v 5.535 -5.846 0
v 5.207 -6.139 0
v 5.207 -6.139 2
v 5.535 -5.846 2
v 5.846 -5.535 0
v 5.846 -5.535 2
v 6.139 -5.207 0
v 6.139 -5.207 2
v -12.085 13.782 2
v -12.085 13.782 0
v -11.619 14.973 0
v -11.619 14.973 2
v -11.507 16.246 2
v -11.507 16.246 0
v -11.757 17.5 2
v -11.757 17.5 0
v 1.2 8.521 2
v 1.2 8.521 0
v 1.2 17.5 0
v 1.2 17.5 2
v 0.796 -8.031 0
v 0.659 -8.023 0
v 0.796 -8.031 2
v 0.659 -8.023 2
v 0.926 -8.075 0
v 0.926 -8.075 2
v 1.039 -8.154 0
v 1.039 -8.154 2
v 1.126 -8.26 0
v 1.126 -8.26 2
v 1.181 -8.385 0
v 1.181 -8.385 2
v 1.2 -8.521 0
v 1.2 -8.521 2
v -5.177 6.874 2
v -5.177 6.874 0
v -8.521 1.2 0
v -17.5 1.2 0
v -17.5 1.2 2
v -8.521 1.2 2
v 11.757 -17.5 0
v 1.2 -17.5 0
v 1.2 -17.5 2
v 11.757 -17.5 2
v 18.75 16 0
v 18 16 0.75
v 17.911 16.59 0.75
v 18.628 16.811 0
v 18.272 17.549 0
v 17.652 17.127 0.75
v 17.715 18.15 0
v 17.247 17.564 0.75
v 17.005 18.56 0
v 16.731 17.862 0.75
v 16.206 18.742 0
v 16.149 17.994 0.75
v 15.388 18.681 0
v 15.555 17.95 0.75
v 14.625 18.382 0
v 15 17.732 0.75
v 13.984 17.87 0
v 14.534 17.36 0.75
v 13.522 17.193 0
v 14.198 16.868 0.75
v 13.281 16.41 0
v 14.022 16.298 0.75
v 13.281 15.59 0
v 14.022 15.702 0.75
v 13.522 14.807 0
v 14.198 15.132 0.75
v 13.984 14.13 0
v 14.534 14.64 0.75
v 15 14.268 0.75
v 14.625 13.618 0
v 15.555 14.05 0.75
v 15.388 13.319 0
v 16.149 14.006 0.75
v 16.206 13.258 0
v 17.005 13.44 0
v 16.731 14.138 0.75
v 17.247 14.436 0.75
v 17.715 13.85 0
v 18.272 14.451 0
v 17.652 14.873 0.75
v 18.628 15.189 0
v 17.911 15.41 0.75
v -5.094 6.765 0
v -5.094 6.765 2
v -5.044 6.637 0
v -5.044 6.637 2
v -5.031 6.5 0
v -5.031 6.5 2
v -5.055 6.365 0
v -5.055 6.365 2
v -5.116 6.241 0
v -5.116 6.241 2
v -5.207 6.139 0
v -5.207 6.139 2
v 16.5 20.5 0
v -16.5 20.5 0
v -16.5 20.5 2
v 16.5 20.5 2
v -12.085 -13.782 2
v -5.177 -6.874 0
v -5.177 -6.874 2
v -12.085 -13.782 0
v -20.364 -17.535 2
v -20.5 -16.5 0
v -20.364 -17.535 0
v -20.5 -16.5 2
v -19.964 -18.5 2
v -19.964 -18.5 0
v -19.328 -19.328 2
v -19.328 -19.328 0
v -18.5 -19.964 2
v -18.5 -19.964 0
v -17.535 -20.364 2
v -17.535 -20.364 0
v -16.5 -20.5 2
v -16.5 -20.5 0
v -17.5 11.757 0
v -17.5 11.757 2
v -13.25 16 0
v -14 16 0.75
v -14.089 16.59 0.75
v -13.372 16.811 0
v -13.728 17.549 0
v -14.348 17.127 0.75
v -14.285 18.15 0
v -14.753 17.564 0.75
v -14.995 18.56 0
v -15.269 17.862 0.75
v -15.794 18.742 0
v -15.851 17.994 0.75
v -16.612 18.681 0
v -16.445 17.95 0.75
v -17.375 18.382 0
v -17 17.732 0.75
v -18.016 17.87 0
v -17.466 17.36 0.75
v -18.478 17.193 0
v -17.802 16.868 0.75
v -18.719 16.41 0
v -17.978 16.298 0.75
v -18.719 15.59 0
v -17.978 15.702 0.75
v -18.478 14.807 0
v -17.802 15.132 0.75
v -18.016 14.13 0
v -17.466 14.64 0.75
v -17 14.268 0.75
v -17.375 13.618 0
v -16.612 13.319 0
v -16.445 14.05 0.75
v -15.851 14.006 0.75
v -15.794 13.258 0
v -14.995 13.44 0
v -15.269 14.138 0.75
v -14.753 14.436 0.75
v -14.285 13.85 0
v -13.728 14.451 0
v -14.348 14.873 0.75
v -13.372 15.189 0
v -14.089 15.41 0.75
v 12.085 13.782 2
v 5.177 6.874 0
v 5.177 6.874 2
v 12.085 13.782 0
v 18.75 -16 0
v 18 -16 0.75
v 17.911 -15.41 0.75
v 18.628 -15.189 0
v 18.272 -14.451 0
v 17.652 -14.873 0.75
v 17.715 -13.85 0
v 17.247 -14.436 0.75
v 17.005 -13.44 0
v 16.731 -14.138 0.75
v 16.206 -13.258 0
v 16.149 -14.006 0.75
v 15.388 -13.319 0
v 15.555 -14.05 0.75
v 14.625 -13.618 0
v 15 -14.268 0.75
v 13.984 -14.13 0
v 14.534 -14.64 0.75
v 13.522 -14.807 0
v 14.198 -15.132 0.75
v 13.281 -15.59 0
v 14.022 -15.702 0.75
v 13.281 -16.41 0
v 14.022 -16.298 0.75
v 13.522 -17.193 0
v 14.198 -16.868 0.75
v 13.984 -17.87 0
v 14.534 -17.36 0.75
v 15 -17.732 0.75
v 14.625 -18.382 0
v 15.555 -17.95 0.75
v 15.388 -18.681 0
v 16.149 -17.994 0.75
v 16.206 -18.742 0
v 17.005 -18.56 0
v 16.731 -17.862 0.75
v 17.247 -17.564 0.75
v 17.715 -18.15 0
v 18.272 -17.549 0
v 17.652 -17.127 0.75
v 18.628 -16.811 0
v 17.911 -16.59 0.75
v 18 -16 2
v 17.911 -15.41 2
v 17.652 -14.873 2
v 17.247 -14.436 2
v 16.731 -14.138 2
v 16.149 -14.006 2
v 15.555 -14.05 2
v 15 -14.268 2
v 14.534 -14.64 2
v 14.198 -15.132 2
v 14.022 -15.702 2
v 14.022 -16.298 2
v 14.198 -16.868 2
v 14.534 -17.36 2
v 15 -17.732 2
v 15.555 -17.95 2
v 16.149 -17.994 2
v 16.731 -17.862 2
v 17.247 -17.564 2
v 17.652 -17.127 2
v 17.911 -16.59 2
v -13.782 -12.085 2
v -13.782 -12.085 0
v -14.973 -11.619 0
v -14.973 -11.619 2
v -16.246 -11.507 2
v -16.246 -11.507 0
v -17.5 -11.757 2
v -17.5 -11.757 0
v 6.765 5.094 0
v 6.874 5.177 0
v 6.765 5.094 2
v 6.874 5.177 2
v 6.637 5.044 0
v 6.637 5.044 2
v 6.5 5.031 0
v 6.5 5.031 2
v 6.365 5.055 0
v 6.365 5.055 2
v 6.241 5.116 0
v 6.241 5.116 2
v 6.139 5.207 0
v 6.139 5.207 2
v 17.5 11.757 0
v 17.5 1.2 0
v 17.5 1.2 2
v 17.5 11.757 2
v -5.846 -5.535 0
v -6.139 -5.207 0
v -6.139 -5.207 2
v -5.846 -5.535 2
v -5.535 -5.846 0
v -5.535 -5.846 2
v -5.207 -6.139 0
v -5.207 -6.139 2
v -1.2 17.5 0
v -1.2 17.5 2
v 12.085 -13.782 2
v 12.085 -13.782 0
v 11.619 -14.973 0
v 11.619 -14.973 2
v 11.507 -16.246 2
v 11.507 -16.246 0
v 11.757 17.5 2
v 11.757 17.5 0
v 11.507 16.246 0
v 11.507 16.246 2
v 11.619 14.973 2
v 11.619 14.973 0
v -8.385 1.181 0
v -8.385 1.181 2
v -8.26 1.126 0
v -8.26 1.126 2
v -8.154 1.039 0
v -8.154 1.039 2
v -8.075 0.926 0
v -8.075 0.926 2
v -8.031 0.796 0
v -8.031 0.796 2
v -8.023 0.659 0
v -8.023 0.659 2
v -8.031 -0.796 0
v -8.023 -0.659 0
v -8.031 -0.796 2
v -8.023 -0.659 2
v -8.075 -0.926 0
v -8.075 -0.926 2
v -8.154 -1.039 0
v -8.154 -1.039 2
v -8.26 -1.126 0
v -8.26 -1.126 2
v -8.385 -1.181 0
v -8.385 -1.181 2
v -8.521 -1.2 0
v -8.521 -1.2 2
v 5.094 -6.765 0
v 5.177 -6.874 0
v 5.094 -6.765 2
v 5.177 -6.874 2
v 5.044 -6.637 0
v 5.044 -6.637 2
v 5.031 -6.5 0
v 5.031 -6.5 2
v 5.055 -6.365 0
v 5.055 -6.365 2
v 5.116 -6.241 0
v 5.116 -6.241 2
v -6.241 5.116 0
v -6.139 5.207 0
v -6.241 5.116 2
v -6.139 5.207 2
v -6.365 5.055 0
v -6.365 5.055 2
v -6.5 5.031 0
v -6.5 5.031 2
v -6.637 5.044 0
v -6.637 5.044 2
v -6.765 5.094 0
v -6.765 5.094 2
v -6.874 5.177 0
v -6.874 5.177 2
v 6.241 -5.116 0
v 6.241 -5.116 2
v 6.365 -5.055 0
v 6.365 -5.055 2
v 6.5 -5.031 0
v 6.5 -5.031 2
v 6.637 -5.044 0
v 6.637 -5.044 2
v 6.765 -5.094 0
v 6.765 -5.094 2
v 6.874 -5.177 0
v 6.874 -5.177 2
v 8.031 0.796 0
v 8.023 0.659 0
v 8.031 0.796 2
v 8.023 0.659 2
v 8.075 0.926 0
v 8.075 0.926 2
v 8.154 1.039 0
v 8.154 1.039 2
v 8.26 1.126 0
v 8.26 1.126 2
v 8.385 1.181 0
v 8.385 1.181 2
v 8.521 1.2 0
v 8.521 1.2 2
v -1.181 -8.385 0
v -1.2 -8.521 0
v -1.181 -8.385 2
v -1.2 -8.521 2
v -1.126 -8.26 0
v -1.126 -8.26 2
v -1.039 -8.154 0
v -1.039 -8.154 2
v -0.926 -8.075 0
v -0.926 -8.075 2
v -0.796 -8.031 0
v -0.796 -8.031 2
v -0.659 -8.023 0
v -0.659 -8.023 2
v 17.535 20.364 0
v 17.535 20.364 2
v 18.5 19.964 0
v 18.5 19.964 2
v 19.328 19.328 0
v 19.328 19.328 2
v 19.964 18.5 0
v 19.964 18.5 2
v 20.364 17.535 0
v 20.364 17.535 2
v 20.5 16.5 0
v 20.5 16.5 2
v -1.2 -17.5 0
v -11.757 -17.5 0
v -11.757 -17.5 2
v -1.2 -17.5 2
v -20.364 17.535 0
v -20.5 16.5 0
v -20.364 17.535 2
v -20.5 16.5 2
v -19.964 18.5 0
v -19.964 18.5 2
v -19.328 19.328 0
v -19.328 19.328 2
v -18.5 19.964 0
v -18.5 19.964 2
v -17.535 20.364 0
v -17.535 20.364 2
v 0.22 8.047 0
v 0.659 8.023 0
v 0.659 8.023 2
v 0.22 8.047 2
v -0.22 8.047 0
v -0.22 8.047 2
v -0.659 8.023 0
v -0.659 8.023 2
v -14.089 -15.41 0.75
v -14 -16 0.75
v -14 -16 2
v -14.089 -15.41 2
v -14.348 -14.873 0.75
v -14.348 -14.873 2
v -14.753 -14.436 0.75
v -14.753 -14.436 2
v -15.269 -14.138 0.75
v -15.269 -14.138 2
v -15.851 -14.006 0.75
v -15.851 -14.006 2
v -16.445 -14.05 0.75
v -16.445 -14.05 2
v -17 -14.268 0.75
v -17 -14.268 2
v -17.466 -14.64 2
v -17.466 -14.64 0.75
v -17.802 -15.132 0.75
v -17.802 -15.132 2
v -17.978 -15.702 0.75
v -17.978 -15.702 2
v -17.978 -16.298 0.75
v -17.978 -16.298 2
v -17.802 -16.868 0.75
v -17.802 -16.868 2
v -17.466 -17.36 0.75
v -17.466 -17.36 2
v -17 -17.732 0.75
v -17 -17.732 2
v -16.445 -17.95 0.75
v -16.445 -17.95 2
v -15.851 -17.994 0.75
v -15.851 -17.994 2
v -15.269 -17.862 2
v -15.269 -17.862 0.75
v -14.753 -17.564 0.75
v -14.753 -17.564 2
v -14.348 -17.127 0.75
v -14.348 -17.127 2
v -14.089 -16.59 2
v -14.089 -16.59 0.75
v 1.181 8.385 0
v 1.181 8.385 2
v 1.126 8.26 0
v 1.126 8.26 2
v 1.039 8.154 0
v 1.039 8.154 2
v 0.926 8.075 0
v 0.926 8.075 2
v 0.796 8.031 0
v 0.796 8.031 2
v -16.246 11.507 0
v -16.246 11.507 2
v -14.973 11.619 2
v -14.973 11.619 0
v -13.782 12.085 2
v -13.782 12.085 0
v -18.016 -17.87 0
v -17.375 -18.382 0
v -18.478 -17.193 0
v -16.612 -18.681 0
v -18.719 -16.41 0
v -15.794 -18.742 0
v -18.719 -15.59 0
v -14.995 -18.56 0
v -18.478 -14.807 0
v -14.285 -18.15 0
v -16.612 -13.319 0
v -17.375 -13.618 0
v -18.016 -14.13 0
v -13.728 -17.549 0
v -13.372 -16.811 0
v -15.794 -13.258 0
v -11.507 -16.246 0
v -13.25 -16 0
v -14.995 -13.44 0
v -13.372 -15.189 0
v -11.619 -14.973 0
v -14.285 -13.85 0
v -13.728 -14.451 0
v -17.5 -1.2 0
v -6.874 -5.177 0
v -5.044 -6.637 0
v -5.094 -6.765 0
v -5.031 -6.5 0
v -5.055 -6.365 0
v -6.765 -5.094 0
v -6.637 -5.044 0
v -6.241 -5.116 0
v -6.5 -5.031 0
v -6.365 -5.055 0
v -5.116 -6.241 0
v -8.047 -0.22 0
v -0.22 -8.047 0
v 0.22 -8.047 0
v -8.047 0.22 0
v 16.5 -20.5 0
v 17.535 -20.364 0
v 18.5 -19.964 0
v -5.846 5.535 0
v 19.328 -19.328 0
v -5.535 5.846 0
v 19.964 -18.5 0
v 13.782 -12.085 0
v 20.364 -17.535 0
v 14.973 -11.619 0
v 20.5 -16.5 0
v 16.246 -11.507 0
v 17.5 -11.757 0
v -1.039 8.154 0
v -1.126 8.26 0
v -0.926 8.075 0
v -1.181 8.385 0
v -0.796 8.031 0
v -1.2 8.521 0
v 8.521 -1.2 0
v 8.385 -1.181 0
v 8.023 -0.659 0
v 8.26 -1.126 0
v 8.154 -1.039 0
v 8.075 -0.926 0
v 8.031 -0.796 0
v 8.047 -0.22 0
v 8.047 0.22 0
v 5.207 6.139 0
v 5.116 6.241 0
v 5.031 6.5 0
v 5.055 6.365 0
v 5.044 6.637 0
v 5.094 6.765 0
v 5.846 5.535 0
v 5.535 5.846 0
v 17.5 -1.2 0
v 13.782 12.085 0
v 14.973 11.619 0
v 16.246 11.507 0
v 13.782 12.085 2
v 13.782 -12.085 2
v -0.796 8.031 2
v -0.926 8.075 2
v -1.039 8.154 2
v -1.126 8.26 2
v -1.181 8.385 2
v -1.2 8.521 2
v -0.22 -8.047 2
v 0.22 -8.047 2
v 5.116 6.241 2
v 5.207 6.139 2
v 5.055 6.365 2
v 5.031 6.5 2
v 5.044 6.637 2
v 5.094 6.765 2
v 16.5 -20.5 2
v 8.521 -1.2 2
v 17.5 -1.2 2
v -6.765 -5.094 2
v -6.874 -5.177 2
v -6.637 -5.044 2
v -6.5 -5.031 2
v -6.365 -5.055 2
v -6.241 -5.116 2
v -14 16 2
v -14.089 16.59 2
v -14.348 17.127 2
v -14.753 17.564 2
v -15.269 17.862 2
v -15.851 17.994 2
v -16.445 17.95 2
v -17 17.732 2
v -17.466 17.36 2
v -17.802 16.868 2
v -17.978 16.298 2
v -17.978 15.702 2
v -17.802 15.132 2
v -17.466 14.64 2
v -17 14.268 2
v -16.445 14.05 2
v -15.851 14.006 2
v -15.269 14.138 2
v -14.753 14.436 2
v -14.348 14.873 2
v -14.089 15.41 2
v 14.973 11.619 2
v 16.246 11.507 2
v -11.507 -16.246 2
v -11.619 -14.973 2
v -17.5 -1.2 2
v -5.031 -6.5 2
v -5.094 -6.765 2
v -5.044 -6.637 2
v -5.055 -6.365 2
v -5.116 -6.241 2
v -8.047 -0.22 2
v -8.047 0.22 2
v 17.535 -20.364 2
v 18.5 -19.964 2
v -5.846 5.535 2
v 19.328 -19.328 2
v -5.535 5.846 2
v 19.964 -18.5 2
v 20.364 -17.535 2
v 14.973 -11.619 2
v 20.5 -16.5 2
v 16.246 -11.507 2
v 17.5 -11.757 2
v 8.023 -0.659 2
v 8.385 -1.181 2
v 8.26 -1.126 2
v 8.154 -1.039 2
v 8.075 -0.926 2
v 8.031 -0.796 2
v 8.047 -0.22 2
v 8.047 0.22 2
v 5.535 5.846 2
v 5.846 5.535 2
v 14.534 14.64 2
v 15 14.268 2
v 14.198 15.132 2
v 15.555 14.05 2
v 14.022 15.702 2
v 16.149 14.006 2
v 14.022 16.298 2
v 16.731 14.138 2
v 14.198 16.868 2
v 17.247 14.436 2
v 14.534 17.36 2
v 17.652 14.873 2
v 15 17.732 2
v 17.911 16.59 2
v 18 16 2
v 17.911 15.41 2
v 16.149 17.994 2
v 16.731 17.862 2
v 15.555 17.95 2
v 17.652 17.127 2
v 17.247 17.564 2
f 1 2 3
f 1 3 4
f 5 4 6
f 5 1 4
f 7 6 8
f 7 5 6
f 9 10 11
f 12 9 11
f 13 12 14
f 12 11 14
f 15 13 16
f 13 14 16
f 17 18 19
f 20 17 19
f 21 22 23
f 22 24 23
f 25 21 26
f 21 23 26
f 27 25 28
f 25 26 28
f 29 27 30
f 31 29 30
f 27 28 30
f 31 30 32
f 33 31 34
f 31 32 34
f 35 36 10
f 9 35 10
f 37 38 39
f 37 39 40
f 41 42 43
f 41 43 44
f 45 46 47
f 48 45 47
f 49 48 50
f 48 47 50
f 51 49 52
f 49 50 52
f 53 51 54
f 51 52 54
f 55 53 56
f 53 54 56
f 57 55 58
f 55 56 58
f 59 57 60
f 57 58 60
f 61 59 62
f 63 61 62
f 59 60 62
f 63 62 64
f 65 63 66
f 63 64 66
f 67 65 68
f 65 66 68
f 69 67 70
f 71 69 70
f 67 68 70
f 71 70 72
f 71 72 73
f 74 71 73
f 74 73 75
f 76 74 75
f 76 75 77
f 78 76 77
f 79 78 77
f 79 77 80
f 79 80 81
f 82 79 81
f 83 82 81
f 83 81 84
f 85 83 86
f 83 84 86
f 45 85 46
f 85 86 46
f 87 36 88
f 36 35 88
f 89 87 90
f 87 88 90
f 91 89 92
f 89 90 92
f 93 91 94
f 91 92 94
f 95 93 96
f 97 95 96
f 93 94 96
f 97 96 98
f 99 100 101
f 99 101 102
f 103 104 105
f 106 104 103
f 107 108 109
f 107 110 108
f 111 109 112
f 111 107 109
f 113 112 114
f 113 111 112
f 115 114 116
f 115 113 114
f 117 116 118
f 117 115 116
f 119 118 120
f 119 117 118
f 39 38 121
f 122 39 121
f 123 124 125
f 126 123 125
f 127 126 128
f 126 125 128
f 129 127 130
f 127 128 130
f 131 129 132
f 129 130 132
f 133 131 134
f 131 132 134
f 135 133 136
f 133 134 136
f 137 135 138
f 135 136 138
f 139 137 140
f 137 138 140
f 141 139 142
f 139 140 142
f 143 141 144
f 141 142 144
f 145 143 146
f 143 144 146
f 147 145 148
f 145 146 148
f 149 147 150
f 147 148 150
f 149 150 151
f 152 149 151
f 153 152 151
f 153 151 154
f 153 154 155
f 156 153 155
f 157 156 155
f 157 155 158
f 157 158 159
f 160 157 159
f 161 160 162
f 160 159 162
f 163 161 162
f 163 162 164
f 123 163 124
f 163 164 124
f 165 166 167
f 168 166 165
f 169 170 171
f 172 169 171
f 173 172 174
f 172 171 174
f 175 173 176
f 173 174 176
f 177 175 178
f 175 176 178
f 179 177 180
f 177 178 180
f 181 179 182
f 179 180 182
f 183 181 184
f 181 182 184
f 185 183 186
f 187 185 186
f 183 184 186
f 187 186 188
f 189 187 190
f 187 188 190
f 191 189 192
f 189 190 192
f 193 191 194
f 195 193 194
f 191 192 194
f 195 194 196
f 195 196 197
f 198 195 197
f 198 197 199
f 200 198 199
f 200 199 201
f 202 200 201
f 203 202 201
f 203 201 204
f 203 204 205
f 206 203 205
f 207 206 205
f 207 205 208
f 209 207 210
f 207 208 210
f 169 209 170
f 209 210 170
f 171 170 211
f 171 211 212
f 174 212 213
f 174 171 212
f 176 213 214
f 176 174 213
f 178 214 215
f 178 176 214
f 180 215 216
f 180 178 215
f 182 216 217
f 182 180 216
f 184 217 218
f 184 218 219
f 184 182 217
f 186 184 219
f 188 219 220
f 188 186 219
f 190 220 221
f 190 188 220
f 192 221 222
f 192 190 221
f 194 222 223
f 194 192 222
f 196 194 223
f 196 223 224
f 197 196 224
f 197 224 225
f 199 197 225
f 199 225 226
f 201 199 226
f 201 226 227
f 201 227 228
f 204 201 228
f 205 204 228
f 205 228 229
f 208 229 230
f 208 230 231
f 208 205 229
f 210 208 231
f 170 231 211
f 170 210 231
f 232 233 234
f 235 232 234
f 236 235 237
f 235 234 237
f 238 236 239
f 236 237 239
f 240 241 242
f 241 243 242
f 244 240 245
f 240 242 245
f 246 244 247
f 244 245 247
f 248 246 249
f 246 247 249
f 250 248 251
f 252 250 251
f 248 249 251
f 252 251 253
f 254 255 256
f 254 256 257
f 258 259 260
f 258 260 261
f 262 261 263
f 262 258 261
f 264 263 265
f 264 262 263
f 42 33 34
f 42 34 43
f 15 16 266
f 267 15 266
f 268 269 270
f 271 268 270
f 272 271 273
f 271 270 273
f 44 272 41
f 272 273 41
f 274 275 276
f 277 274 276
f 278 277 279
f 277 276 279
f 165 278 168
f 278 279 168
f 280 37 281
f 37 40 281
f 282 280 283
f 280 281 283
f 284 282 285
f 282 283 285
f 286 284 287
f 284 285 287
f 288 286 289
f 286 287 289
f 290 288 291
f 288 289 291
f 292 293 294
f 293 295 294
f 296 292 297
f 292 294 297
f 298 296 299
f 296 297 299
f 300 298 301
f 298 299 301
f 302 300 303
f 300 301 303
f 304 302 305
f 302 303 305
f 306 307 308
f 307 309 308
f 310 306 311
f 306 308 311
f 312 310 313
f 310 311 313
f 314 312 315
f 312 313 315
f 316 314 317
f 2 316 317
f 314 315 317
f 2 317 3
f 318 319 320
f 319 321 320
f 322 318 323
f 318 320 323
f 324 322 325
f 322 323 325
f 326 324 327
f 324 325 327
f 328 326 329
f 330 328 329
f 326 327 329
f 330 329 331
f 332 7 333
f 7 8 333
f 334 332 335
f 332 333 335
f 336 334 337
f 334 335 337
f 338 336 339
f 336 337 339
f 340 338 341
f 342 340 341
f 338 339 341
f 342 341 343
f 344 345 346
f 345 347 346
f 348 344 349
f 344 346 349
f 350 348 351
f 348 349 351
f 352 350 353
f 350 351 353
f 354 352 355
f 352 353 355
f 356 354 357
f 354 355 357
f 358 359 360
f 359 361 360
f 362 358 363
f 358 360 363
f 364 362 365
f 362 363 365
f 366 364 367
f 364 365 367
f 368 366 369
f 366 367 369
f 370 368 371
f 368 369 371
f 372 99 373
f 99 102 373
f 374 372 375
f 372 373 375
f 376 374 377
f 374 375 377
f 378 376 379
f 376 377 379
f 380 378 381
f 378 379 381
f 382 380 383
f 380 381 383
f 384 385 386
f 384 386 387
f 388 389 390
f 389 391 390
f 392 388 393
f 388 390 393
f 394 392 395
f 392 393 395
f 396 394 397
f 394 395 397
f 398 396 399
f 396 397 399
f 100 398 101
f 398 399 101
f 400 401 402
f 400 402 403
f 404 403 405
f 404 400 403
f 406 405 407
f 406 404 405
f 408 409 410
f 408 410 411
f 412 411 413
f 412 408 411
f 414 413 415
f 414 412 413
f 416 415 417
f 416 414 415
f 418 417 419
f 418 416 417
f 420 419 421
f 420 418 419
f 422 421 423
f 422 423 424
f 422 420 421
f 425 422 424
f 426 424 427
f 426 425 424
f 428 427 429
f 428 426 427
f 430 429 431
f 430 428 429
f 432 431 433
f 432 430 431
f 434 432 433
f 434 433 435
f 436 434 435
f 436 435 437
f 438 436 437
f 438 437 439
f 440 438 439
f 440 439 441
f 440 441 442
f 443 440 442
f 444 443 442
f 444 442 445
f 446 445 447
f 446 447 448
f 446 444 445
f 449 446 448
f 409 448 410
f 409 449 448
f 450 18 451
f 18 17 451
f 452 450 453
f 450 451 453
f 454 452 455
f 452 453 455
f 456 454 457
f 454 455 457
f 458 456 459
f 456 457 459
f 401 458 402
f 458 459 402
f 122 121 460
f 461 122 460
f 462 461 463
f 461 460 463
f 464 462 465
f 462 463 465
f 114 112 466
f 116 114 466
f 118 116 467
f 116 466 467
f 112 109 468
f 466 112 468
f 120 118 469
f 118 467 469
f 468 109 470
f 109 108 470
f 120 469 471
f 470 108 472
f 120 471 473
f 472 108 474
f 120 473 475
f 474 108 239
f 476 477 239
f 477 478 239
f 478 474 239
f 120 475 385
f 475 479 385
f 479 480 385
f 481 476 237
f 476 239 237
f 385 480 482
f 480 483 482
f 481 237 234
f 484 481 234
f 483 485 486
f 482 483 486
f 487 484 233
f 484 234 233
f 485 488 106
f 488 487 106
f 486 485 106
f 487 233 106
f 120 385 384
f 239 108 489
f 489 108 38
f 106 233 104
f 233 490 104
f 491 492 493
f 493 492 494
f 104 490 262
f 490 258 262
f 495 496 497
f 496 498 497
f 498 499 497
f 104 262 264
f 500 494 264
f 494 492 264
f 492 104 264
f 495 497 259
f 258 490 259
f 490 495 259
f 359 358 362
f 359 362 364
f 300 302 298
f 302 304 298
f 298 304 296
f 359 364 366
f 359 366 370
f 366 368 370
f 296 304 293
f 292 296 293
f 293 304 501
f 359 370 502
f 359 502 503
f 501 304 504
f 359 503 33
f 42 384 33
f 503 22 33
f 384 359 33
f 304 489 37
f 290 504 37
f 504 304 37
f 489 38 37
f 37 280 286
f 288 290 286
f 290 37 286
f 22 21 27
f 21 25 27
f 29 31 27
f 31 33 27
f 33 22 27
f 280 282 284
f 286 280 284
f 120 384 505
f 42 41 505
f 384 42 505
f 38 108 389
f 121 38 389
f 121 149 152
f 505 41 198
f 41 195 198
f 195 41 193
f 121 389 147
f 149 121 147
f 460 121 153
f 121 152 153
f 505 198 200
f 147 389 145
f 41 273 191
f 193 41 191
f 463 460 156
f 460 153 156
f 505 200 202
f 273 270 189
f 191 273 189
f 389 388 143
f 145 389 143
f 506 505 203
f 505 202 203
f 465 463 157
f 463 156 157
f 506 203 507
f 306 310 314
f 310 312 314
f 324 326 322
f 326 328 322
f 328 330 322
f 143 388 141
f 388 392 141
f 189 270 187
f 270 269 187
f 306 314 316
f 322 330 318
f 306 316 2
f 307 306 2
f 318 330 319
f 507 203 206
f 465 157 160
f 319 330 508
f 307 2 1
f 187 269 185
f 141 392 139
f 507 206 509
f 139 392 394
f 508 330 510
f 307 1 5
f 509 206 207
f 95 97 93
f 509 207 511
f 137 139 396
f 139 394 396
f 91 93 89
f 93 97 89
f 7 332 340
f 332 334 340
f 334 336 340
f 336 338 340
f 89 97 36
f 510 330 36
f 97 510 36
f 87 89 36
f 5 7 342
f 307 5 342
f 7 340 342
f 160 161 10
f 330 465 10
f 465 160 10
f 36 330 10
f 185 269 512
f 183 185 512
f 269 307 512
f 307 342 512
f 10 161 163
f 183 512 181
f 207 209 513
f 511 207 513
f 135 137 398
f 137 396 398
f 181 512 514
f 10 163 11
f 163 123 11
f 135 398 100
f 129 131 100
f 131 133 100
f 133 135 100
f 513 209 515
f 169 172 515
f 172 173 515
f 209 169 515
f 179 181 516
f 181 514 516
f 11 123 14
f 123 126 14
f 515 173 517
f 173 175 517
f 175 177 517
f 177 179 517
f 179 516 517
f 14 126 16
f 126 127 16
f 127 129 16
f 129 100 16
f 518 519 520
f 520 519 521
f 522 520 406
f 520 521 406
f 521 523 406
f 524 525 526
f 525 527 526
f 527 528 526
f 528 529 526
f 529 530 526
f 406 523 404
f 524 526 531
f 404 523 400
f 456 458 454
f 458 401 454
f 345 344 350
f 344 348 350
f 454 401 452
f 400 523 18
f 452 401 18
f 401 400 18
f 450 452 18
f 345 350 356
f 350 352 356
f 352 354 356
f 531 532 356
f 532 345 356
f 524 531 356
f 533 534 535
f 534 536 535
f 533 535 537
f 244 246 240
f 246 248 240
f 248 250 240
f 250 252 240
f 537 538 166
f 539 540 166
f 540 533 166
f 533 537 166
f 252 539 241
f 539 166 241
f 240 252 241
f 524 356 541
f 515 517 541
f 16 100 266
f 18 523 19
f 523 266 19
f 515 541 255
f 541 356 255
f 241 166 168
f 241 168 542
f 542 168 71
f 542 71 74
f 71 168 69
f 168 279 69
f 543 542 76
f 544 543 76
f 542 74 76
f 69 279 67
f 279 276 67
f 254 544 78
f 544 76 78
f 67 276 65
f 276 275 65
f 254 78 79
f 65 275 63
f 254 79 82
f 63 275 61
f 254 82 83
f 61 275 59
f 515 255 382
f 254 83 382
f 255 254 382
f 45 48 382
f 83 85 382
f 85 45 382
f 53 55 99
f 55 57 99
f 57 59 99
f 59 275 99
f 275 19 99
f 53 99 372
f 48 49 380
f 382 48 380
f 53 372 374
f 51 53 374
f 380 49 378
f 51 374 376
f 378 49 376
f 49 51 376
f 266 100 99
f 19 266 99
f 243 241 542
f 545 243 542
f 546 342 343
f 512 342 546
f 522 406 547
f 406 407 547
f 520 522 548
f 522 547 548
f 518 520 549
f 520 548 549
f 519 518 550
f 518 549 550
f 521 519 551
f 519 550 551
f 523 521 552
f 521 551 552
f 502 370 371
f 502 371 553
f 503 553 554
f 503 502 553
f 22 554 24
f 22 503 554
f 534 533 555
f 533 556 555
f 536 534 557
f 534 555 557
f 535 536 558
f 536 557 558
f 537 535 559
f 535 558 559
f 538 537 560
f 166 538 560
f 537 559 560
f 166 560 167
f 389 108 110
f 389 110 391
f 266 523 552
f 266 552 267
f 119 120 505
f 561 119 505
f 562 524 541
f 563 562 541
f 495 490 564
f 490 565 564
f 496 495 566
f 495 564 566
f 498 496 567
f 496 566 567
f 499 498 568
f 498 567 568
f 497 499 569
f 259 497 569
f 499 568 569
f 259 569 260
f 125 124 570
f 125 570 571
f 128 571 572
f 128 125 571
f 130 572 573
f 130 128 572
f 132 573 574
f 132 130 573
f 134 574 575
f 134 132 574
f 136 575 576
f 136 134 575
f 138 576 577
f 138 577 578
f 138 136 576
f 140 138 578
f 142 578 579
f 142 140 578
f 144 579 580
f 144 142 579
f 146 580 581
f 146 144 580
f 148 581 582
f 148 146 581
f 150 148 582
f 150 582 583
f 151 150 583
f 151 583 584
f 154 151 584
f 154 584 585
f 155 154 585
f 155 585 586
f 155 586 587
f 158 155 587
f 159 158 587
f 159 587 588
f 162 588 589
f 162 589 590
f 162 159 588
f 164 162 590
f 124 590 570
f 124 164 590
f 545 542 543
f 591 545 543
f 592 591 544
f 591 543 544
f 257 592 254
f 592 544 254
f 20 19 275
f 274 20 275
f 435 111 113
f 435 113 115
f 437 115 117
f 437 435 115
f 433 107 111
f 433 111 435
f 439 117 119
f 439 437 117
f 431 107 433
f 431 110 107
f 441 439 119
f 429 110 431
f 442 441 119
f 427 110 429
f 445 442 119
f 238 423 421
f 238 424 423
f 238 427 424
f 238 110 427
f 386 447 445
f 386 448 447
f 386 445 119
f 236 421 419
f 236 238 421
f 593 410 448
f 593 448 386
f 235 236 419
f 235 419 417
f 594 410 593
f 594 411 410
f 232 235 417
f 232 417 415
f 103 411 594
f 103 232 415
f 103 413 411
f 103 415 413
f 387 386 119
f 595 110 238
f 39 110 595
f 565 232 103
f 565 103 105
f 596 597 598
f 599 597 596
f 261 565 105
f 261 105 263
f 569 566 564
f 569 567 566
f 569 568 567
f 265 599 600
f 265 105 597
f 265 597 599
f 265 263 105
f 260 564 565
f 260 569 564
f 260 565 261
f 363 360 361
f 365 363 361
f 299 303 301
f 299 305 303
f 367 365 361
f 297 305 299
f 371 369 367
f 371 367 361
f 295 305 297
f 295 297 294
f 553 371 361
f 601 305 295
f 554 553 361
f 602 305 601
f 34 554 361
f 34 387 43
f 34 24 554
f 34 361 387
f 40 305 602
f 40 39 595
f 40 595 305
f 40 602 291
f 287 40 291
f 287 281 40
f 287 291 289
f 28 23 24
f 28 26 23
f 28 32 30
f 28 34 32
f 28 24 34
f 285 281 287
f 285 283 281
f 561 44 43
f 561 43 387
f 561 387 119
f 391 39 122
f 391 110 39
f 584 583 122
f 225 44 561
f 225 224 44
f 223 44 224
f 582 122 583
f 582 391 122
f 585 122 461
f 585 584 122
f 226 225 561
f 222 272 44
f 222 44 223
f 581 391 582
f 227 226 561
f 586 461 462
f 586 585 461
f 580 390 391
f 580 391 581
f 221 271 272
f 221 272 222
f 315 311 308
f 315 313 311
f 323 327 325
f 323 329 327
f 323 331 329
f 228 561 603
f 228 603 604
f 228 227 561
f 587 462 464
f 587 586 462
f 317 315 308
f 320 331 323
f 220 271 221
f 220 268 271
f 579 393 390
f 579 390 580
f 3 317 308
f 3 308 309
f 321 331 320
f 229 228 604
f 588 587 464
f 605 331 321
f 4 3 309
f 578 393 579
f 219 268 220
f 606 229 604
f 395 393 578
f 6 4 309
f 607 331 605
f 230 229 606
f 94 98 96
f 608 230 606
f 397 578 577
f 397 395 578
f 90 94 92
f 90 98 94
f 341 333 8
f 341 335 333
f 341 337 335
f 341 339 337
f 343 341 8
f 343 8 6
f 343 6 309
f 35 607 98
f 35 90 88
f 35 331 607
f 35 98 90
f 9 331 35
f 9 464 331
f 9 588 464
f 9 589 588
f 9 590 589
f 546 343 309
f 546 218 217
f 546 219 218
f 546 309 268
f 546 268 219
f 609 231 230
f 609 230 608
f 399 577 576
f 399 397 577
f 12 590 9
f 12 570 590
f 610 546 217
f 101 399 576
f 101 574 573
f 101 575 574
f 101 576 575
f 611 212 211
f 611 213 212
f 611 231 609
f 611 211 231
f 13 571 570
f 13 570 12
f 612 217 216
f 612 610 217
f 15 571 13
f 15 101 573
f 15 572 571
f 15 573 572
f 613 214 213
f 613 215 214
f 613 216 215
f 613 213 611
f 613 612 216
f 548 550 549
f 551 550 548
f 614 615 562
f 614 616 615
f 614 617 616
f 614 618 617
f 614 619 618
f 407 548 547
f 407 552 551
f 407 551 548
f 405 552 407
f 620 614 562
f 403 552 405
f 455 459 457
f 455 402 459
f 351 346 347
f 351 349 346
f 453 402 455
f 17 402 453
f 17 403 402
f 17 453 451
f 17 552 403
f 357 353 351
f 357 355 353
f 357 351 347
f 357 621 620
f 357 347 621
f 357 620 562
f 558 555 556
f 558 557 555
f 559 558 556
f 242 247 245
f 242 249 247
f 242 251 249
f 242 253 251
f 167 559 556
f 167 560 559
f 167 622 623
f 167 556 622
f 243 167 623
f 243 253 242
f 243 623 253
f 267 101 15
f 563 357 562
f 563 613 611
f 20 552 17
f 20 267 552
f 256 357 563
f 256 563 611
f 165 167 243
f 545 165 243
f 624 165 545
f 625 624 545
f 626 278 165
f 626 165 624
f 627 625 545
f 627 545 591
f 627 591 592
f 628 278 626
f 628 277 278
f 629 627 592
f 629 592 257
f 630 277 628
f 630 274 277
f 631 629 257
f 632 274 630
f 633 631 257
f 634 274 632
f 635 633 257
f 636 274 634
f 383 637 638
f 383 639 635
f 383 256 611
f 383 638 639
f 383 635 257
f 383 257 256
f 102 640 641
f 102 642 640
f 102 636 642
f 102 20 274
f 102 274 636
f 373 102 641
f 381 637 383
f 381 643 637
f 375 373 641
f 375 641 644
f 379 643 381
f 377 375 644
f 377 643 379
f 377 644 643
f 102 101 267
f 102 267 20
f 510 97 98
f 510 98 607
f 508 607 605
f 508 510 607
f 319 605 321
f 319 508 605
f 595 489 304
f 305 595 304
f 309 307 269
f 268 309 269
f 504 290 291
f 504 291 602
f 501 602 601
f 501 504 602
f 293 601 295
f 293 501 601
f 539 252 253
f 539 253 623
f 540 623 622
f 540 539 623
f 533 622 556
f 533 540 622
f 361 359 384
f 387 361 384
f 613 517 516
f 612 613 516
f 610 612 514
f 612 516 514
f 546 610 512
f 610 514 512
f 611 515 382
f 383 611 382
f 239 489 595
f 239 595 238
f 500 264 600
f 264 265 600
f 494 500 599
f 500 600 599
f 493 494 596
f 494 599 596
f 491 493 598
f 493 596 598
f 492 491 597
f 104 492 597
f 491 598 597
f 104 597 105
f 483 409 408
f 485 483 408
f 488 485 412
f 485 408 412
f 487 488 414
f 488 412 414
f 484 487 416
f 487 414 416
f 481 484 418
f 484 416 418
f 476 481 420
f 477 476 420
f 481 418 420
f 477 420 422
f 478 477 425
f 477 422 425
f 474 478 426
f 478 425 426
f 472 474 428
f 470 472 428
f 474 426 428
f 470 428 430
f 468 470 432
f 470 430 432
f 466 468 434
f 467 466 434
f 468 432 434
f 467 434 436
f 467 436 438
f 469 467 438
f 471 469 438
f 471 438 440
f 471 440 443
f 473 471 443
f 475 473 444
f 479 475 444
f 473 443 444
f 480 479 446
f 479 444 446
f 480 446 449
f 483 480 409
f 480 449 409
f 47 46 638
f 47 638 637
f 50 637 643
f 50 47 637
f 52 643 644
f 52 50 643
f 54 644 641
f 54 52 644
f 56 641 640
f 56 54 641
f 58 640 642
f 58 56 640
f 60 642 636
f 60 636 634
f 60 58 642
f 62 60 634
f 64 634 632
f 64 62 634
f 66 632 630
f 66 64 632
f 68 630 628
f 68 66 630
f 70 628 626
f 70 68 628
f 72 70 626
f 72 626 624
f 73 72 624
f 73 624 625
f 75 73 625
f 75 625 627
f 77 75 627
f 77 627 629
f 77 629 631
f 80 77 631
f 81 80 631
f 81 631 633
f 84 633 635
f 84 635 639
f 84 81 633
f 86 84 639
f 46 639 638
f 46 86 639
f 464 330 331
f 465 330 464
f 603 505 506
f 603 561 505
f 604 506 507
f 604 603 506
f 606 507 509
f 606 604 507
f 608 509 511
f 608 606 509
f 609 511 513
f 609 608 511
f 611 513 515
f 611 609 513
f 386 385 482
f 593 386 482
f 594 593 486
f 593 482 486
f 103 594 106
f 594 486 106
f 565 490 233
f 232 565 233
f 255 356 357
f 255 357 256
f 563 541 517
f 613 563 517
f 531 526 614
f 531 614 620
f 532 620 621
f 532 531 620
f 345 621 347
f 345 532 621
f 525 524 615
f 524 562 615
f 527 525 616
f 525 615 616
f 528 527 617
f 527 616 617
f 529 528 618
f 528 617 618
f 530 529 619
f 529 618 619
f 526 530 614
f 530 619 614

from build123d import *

# Parameters (mm, degrees)
SKETCH_W     = 41
SKETCH_H     = 41
SKETCH_R     = 2
PAD_DEPTH    = 2
FILLET_R     = 0.5
FILLET001_R  = 4
CHAMFER_SIZE = 0.75


with BuildPart() as part:
    # Sketch → Pad (new body)
    with BuildSketch(Plane.XY):
        Rectangle(SKETCH_W, SKETCH_H)
        with Locations((-16, 16)):
            Circle(SKETCH_R, mode=Mode.SUBTRACT)
        with Locations((16, 16)):
            Circle(SKETCH_R, mode=Mode.SUBTRACT)
        with Locations((-16, -16)):
            Circle(SKETCH_R, mode=Mode.SUBTRACT)
        with Locations((16, -16)):
            Circle(SKETCH_R, mode=Mode.SUBTRACT)
        with BuildLine():
            Line((-17.5, 1.2), (-7.960057, 1.2))
            ThreePointArc((-7.960057, 1.2), (-8.05, 0), (-7.960057, -1.2))
            Line((-17.5, -1.2), (-7.960057, -1.2))
            Line((-17.5, -1.2), (-17.5, -11.757359))
            ThreePointArc((-13.781771, -12.084715), (-15.605344, -11.517339), (-17.5, -11.757359))
            Line((-6.477138, -4.780082), (-13.781771, -12.084715))
            ThreePointArc((-6.477138, -4.780082), (-5.69221, -5.69221), (-4.780082, -6.477138))
            Line((-4.780082, -6.477138), (-12.084715, -13.781771))
            ThreePointArc((-11.757359, -17.5), (-11.517339, -15.605344), (-12.084715, -13.781771))
            Line((-11.757359, -17.5), (-1.2, -17.5))
            Line((-1.2, -7.960057), (-1.2, -17.5))
            ThreePointArc((-1.2, -7.960057), (0, -8.05), (1.2, -7.960057))
            Line((1.2, -7.960057), (1.2, -17.5))
            Line((1.2, -17.5), (11.757359, -17.5))
            ThreePointArc((12.084715, -13.781771), (11.517339, -15.605344), (11.757359, -17.5))
            Line((4.780082, -6.477138), (12.084715, -13.781771))
            ThreePointArc((4.780082, -6.477138), (5.69221, -5.69221), (6.477138, -4.780082))
            Line((6.477138, -4.780082), (13.781771, -12.084715))
            ThreePointArc((17.5, -11.757359), (15.605344, -11.517339), (13.781771, -12.084715))
            Line((17.5, -1.2), (17.5, -11.757359))
            Line((7.960057, -1.2), (17.5, -1.2))
            ThreePointArc((7.960057, -1.2), (8.05, 0), (7.960057, 1.2))
            Line((7.960057, 1.2), (17.5, 1.2))
            Line((17.5, 1.2), (17.5, 11.757359))
            ThreePointArc((13.781771, 12.084715), (15.605344, 11.517339), (17.5, 11.757359))
            Line((6.477138, 4.780082), (13.781771, 12.084715))
            ThreePointArc((6.477138, 4.780082), (5.69221, 5.69221), (4.780082, 6.477138))
            Line((4.780082, 6.477138), (12.084715, 13.781771))
            ThreePointArc((11.757359, 17.5), (11.517339, 15.605344), (12.084715, 13.781771))
            Line((1.2, 17.5), (11.757359, 17.5))
            Line((1.2, 7.960057), (1.2, 17.5))
            ThreePointArc((1.2, 7.960057), (0, 8.05), (-1.2, 7.960057))
            Line((-1.2, 7.960057), (-1.2, 17.5))
            Line((-11.757359, 17.5), (-1.2, 17.5))
            ThreePointArc((-12.084715, 13.781771), (-11.517339, 15.605344), (-11.757359, 17.5))
            Line((-4.780082, 6.477138), (-12.084715, 13.781771))
            ThreePointArc((-4.780082, 6.477138), (-5.69221, 5.69221), (-6.477138, 4.780082))
            Line((-6.477138, 4.780082), (-13.781771, 12.084715))
            ThreePointArc((-17.5, 11.757359), (-15.605344, 11.517339), (-13.781771, 12.084715))
            Line((-17.5, 1.2), (-17.5, 11.757359))
        make_face(mode=Mode.SUBTRACT)
    extrude(amount=PAD_DEPTH)

    # Fillet
    fillet_edges = [part.edges().sort_by_distance(p)[0] for p in [
        (-4.780082, -6.477138, 1),
        (-7.960057, -1.2, 1),
        (-7.960057, 1.2, 1),
        (-6.477138, 4.780082, 1),
        (-4.780082, 6.477138, 1),
        (-1.2, 7.960057, 1),
        (1.2, 7.960057, 1),
        (4.780082, 6.477138, 1),
        (6.477138, 4.780082, 1),
        (7.960057, 1.2, 1),
        (7.960057, -1.2, 1),
        (4.780082, -6.477138, 1),
        (-6.477138, -4.780082, 1),
        (-1.2, -7.960057, 1),
        (1.2, -7.960057, 1),
        (6.477138, -4.780082, 1),
    ]]
    fillet(fillet_edges, radius=FILLET_R)

    # Fillet001
    fillet001_edges = [part.edges().sort_by_distance(p)[0] for p in [
        (20.5, -20.5, 1),
        (20.5, 20.5, 1),
        (-20.5, 20.5, 1),
        (-20.5, -20.5, 1),
    ]]
    fillet(fillet001_edges, radius=FILLET001_R)

    # Chamfer
    chamfer_edges = [part.edges().sort_by_distance(p)[0] for p in [
        (14, -16, 0),
        (-18, -16, 0),
        (-18, 16, 0),
        (14, 16, 0),
    ]]
    chamfer(chamfer_edges, length=CHAMFER_SIZE)


solid = part.part
